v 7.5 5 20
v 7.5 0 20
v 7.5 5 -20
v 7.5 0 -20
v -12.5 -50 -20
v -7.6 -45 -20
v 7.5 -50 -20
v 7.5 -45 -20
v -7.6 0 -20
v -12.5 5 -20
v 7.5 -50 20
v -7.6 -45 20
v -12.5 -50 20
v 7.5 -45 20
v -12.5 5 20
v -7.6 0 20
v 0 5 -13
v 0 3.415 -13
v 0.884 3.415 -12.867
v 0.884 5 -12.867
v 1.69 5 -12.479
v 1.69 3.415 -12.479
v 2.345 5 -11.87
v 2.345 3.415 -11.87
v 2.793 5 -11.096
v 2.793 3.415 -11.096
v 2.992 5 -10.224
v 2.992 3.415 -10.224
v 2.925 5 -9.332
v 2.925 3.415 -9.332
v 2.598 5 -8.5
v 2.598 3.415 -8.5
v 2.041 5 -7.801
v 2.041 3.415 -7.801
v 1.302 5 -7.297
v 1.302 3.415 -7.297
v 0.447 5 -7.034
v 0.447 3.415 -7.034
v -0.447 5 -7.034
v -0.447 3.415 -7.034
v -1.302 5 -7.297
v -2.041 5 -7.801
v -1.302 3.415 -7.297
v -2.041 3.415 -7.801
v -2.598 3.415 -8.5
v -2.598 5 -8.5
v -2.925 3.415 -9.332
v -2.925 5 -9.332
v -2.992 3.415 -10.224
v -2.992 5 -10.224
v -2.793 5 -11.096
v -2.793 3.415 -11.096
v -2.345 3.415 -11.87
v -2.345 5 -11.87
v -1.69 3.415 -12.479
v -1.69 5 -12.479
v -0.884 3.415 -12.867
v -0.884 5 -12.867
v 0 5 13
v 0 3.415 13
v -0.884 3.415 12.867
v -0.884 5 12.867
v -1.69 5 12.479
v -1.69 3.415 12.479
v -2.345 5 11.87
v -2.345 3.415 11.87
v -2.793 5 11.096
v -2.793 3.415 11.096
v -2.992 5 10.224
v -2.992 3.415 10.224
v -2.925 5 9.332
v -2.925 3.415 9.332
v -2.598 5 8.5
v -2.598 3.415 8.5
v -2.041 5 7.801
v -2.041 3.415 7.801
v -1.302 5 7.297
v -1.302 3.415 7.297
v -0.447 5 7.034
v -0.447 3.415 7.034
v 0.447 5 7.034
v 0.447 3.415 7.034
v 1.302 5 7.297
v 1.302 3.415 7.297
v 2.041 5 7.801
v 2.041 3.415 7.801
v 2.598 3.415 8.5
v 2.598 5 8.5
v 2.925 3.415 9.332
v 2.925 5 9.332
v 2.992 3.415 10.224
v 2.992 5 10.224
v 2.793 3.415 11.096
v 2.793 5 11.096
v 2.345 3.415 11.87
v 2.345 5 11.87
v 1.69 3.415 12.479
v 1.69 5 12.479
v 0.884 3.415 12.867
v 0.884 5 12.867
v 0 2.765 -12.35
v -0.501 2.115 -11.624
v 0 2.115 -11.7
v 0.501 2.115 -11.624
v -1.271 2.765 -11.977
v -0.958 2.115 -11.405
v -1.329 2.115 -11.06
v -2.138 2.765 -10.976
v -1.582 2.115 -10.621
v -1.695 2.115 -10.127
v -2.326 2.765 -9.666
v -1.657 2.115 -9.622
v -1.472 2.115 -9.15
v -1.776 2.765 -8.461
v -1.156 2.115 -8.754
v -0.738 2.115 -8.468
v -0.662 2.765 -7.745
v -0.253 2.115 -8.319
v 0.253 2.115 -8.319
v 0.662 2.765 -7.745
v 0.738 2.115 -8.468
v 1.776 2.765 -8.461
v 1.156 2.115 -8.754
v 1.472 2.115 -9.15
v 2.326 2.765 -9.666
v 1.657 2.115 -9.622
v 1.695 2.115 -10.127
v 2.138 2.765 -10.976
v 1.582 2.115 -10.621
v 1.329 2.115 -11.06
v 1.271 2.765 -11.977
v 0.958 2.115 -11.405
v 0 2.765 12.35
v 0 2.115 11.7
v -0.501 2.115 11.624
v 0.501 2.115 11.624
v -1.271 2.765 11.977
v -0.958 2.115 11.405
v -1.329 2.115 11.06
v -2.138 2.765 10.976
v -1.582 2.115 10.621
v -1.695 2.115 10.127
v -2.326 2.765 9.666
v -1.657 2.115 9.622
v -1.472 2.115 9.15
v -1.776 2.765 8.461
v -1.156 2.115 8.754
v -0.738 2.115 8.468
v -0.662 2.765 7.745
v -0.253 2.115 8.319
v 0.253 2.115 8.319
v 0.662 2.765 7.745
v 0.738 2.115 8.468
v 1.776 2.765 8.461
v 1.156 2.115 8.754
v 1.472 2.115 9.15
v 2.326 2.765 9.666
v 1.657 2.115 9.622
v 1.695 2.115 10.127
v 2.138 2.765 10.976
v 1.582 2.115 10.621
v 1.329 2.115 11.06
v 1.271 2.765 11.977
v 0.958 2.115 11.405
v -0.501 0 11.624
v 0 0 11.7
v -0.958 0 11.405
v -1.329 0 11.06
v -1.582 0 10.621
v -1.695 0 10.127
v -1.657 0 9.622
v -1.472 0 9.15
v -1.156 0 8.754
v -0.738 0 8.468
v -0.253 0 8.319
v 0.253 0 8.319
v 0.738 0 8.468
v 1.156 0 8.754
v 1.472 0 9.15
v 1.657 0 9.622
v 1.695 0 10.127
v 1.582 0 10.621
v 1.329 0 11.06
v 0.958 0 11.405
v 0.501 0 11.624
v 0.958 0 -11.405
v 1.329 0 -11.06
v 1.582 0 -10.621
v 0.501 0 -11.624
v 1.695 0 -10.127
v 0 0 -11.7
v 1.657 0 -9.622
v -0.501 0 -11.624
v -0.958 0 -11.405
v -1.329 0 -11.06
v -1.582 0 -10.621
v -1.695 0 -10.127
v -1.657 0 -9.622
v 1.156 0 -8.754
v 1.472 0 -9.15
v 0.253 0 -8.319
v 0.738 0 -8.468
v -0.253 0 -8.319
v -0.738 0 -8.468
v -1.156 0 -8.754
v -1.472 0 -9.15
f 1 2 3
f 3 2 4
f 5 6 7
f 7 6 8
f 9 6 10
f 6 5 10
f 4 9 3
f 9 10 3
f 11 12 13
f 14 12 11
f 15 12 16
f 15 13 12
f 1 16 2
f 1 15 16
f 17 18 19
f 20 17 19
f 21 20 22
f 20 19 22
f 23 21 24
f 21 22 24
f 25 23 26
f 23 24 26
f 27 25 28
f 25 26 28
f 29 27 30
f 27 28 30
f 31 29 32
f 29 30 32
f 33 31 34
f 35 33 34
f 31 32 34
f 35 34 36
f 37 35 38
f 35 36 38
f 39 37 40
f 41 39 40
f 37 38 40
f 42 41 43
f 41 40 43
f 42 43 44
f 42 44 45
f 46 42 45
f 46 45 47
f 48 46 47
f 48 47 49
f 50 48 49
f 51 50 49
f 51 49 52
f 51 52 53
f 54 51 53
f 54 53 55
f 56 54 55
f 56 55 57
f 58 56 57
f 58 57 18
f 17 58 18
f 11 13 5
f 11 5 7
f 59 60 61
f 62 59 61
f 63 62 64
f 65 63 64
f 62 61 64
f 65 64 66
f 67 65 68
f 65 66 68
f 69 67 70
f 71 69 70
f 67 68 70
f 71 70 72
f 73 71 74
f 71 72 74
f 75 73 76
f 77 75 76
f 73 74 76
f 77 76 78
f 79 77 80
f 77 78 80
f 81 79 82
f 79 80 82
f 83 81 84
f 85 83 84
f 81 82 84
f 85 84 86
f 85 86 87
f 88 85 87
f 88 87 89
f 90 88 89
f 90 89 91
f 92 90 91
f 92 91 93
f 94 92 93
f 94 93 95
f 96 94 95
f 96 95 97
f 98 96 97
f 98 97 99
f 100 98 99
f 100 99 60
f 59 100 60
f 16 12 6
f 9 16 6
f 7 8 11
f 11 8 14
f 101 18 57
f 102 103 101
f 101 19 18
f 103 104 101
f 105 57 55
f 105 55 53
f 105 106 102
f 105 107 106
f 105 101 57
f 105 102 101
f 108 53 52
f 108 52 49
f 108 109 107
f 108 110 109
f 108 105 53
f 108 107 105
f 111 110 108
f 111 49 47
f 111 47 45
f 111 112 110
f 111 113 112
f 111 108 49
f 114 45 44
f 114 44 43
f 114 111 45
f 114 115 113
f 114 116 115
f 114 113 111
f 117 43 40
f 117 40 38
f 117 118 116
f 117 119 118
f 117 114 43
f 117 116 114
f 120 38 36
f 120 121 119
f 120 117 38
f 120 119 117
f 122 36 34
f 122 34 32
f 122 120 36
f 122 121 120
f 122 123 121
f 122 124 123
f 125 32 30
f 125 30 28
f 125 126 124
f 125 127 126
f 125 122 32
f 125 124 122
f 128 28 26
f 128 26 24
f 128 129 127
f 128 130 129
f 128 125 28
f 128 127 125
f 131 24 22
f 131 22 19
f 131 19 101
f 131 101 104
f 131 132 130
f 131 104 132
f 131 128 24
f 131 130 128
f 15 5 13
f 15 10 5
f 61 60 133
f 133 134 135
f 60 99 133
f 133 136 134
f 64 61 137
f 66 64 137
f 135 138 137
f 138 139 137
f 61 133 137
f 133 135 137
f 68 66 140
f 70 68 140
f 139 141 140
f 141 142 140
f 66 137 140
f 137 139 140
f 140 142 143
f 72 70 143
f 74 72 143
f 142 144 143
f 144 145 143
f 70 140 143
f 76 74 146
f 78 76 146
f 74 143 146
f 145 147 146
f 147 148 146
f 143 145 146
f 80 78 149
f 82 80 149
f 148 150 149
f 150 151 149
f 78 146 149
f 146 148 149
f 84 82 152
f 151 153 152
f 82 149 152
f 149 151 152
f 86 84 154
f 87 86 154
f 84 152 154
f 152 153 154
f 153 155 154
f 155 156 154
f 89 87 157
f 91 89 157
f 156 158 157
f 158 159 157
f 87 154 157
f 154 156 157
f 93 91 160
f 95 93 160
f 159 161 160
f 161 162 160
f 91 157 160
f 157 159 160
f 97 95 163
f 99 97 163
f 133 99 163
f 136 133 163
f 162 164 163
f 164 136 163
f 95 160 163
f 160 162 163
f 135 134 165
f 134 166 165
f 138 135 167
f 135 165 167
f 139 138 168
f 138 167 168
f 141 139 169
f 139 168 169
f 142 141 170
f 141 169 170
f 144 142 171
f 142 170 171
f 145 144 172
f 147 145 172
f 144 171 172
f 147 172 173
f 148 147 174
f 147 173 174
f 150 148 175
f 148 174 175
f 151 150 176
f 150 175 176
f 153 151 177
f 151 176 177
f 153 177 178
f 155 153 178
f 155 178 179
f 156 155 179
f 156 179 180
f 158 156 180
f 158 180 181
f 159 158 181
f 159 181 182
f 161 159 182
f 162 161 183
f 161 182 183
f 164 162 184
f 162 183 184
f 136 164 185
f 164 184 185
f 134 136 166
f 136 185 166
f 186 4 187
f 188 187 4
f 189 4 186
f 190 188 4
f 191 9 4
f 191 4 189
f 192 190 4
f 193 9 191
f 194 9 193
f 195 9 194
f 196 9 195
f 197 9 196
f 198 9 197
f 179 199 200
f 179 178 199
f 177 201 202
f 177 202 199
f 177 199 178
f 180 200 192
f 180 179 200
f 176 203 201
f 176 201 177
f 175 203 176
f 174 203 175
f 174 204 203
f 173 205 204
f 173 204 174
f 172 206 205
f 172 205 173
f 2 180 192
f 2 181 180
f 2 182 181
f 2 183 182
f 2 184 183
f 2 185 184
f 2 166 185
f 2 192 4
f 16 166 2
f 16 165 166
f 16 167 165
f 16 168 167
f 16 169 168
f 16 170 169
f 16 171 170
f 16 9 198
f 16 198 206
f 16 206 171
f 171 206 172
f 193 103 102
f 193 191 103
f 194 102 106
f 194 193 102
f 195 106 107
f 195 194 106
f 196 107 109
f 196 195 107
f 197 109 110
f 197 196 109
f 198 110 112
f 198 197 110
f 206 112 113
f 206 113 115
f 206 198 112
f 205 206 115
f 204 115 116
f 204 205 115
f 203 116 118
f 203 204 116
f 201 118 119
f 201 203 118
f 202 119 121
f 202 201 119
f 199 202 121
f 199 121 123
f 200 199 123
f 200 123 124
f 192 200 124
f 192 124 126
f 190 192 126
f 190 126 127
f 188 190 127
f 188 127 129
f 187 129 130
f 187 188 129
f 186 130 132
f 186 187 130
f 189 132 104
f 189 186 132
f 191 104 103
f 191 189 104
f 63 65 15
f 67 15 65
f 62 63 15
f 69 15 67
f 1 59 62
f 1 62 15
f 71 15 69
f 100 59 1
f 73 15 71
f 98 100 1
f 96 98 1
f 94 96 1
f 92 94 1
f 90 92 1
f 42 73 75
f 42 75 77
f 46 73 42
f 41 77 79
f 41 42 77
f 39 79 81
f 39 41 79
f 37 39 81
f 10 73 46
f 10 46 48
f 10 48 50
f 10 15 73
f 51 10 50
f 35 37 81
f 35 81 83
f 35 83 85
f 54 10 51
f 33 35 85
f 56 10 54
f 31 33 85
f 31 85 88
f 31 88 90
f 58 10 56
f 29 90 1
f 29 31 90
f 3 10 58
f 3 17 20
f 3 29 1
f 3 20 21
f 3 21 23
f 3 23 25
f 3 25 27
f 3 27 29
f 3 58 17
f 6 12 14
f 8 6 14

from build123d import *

# Parameters (mm, degrees)
BOSS_EXTRUDE1_DEPTH = 5
SKETCH2_W           = 4.9
SKETCH2_H           = 40
BOSS_EXTRUDE2_DEPTH = 45
SKETCH3_W           = 20
SKETCH3_H           = 40
BOSS_EXTRUDE3_DEPTH = 5
SKETCH4_R           = 3
CUT_EXTRUDE1_DEPTH  = 5


with BuildPart() as part:
    # Sketch1 → Boss-Extrude1 (new body)
    with BuildSketch(Plane(origin=(0, 0, 0), x_dir=(1, 0, 0), z_dir=(0, 1, 0))):
        Polygon((-7.5, -20), (7.5, -20), (7.5, 20), (-7.5, 20), (-12.5, 20), (-12.5, -20), align=None)
    extrude(amount=BOSS_EXTRUDE1_DEPTH)

    # Sketch2 → Boss-Extrude2 (add)
    with BuildSketch(Plane(origin=(0, 0, 0), x_dir=(1, 0, 0), z_dir=(0, 1, 0))):
        with Locations((-10.05, 0)):
            Rectangle(SKETCH2_W, SKETCH2_H)
    extrude(amount=-BOSS_EXTRUDE2_DEPTH)

    # Sketch3 → Boss-Extrude3 (add)
    with BuildSketch(Plane.XZ.offset(45)):
        with Locations((-2.5, 0)):
            Rectangle(SKETCH3_W, SKETCH3_H)
    extrude(amount=BOSS_EXTRUDE3_DEPTH)

    # Sketch4 → Cut-Extrude1 (cut)
    with BuildSketch(Plane.XZ):
        with Locations(Location((0, -10, 0), (0, 0, 270))):
            Circle(SKETCH4_R)
        with Locations(Location((0, 10, 0), (0, 0, 90))):
            Circle(SKETCH4_R)
    extrude(amount=-CUT_EXTRUDE1_DEPTH, mode=Mode.SUBTRACT)

    # Sketch5 → Revolve1 (revolve)
    with BuildSketch(Plane(origin=(0, 0, 0), x_dir=(0, -1, 0), z_dir=(-1, 0, 0))):
        Polygon((-3.415, 13), (-2.115, 11.7), (0, 11.7), (0, 13), align=None)
    revolve1 = revolve(axis=Axis((0, 5, 10), (0, -1, 0)))

    # Mirror1: Revolve1 across plane
    add(revolve1.mirror(Plane.XY))


solid = part.part
